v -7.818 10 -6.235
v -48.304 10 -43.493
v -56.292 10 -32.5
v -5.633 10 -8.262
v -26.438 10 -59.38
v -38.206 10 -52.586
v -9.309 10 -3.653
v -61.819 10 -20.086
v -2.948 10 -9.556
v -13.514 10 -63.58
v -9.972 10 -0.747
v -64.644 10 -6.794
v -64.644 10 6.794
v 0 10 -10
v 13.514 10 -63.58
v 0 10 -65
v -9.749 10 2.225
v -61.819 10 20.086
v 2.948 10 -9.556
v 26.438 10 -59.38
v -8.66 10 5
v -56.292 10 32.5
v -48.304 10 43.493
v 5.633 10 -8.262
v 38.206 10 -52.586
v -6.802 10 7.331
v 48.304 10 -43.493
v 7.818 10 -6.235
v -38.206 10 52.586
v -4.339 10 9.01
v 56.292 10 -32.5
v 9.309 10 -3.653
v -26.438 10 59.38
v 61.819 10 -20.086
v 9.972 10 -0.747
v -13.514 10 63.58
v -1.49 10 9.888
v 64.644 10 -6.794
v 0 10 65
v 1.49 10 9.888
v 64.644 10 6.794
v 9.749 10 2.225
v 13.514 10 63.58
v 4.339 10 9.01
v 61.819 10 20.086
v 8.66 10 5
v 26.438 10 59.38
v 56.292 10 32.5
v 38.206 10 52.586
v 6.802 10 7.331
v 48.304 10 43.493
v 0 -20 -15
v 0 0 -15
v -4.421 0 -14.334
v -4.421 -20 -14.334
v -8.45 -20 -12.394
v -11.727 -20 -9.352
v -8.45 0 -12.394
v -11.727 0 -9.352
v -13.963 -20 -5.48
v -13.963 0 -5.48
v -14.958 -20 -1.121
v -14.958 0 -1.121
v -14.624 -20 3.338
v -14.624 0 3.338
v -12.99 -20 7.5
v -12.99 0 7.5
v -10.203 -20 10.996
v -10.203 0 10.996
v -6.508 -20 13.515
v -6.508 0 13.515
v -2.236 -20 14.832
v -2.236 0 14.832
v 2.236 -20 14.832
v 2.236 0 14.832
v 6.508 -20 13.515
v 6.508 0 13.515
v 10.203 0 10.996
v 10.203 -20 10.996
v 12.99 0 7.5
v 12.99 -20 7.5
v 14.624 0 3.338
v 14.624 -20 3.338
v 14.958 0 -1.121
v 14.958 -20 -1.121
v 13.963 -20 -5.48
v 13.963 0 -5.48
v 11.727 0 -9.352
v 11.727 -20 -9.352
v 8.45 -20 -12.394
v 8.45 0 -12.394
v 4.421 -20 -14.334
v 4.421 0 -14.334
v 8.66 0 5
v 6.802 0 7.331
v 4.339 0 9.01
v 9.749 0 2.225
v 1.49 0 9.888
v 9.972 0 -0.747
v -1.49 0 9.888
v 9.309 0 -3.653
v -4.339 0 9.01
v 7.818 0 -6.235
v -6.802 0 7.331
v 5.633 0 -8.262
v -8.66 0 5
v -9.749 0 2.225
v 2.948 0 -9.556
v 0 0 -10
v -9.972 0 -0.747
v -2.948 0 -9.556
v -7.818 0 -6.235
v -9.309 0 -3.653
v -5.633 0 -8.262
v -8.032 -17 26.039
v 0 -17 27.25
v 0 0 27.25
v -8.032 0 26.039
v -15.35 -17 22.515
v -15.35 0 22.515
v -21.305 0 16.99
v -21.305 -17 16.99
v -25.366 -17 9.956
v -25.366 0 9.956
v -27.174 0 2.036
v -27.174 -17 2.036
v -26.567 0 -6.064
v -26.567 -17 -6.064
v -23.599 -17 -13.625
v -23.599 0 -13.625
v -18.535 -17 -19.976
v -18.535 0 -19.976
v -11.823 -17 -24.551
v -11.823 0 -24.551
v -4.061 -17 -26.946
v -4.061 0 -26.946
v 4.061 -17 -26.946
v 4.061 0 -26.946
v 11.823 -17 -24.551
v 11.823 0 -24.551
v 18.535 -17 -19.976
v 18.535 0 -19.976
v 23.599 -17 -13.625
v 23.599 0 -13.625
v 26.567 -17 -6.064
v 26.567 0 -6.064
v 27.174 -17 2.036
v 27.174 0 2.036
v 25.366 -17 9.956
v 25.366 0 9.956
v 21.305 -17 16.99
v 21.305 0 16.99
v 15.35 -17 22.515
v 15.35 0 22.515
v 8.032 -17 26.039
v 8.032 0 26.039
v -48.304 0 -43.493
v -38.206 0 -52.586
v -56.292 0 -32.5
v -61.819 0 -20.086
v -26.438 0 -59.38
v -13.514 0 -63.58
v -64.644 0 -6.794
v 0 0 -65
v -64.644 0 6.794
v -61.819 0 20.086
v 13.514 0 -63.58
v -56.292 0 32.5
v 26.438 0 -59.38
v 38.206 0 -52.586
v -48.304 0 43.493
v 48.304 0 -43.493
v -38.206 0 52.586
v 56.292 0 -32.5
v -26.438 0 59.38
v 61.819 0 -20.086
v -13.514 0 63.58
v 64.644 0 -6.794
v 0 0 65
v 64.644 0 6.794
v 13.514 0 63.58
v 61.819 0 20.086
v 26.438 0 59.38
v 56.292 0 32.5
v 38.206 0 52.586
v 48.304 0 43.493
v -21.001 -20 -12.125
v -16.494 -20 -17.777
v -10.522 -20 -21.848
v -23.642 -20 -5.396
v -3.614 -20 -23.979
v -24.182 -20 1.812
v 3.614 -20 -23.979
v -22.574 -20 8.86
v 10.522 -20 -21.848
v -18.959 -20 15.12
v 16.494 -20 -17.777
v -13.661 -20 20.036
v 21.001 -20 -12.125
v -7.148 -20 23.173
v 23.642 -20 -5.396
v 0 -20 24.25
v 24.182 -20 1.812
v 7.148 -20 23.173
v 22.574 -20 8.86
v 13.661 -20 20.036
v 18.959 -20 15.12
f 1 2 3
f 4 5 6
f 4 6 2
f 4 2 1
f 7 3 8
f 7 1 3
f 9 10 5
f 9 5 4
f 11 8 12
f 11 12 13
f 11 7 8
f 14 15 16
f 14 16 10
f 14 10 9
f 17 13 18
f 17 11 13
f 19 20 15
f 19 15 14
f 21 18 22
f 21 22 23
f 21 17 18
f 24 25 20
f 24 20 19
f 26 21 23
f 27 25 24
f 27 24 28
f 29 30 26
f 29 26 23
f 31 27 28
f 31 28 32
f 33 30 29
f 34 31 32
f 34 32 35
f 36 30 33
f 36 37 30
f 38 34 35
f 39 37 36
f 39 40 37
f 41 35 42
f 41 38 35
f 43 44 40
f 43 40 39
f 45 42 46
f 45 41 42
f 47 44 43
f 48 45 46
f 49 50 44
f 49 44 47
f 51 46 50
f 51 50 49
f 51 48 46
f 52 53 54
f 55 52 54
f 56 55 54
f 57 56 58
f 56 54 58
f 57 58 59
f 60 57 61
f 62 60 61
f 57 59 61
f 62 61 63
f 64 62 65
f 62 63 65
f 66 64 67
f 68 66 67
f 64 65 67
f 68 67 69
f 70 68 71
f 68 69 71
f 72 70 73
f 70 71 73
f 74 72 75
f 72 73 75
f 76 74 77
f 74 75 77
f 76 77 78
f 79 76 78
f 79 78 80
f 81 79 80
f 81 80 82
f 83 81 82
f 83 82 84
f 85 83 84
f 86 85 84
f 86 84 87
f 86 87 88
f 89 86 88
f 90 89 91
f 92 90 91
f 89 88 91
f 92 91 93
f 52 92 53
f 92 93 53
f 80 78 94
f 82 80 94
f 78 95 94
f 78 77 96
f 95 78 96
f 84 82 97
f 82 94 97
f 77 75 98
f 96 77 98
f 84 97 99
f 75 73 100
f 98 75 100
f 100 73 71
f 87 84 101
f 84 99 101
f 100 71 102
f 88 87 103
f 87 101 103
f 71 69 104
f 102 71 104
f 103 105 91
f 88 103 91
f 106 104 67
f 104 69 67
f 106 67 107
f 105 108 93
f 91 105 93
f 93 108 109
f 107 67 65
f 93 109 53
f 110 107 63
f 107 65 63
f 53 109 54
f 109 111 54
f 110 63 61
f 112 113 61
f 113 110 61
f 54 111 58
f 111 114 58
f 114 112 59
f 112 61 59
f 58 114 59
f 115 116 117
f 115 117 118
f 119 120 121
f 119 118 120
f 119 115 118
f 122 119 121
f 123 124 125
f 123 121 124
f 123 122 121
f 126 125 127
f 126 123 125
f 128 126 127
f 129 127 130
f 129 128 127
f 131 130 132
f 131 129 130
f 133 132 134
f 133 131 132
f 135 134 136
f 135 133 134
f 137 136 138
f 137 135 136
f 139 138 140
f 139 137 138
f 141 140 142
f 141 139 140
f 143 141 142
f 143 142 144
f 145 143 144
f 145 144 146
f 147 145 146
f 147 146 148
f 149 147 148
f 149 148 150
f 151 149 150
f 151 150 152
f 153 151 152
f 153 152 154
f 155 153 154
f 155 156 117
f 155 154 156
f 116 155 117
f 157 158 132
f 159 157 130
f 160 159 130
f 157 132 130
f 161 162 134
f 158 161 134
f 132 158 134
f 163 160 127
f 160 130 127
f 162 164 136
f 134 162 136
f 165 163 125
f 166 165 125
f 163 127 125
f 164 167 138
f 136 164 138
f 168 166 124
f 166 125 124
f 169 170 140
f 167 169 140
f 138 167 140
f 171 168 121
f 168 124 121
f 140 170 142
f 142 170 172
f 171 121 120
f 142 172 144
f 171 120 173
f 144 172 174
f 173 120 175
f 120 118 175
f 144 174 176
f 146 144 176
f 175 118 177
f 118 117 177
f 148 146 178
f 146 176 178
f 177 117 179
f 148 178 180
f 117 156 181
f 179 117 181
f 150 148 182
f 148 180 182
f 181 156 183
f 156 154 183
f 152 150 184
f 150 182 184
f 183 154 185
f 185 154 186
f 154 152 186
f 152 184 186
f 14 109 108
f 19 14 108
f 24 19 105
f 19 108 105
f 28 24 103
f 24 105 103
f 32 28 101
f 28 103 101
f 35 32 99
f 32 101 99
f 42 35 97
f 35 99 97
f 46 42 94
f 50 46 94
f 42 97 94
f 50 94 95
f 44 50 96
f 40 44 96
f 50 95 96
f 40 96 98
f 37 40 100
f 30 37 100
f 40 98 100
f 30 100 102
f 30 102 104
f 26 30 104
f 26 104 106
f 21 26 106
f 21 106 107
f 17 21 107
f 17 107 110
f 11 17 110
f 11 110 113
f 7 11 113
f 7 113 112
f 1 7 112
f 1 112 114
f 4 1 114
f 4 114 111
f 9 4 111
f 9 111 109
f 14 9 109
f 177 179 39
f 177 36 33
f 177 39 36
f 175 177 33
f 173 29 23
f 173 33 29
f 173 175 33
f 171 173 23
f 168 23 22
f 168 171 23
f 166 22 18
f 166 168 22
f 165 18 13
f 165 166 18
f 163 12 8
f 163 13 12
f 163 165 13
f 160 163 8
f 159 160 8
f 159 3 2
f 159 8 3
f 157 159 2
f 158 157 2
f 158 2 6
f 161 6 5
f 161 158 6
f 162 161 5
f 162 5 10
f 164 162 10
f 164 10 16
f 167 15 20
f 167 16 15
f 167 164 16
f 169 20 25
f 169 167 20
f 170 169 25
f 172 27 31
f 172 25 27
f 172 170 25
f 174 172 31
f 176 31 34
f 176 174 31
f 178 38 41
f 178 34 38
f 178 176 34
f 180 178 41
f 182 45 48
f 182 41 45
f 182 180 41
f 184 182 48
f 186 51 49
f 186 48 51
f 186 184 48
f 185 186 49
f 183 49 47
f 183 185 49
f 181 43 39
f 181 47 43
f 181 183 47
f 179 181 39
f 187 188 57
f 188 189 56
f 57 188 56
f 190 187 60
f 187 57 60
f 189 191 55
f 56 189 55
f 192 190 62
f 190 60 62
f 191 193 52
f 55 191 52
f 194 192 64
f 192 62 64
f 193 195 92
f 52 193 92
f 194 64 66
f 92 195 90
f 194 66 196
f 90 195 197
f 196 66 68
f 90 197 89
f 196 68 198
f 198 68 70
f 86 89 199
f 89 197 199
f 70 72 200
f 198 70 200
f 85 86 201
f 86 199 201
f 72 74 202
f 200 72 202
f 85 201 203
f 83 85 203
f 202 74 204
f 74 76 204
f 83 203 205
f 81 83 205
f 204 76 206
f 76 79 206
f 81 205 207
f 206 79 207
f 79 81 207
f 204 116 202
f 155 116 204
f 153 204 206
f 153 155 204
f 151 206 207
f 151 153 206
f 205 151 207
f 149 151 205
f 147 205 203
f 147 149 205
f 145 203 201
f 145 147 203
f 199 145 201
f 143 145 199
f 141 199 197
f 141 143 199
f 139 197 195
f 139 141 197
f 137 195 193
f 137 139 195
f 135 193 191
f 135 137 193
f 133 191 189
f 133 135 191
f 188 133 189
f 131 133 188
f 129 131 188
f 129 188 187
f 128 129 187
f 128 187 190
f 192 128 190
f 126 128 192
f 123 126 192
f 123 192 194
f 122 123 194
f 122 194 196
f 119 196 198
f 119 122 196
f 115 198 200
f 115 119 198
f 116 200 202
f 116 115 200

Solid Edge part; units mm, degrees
sketch "Sketch1" plane through (0, 0, 0) normal (1, 0, 0) x (0, 1, 0)
  line L0 (0, 65) -> (0, 27.25)
  line L1 (0, 27.25) -> (-20, 27.25)
  line L2 (-20, 27.25) -> (-20, 0)
  line L3 (-20, 0) -> (10, 0)
  line L4 (10, 0) -> (10, 65)
  line L5 (10, 65) -> (0, 65)
revolve "RevolvedProtrusion1" add sketch "Sketch1" angle 360 about axis through (0, -20, 0) along (0, 1, 0)
hole "Agujero_1" at (0, -20, 0) direction (0, 1, 0) diameter 20 end up to next counterbore diameter 30 counterbore depth 20
chamfer "Chaflán_1" distance 3 angle 45 1 edges at (0, -20, 27.25)
properties material "Acero ASTM A36"
